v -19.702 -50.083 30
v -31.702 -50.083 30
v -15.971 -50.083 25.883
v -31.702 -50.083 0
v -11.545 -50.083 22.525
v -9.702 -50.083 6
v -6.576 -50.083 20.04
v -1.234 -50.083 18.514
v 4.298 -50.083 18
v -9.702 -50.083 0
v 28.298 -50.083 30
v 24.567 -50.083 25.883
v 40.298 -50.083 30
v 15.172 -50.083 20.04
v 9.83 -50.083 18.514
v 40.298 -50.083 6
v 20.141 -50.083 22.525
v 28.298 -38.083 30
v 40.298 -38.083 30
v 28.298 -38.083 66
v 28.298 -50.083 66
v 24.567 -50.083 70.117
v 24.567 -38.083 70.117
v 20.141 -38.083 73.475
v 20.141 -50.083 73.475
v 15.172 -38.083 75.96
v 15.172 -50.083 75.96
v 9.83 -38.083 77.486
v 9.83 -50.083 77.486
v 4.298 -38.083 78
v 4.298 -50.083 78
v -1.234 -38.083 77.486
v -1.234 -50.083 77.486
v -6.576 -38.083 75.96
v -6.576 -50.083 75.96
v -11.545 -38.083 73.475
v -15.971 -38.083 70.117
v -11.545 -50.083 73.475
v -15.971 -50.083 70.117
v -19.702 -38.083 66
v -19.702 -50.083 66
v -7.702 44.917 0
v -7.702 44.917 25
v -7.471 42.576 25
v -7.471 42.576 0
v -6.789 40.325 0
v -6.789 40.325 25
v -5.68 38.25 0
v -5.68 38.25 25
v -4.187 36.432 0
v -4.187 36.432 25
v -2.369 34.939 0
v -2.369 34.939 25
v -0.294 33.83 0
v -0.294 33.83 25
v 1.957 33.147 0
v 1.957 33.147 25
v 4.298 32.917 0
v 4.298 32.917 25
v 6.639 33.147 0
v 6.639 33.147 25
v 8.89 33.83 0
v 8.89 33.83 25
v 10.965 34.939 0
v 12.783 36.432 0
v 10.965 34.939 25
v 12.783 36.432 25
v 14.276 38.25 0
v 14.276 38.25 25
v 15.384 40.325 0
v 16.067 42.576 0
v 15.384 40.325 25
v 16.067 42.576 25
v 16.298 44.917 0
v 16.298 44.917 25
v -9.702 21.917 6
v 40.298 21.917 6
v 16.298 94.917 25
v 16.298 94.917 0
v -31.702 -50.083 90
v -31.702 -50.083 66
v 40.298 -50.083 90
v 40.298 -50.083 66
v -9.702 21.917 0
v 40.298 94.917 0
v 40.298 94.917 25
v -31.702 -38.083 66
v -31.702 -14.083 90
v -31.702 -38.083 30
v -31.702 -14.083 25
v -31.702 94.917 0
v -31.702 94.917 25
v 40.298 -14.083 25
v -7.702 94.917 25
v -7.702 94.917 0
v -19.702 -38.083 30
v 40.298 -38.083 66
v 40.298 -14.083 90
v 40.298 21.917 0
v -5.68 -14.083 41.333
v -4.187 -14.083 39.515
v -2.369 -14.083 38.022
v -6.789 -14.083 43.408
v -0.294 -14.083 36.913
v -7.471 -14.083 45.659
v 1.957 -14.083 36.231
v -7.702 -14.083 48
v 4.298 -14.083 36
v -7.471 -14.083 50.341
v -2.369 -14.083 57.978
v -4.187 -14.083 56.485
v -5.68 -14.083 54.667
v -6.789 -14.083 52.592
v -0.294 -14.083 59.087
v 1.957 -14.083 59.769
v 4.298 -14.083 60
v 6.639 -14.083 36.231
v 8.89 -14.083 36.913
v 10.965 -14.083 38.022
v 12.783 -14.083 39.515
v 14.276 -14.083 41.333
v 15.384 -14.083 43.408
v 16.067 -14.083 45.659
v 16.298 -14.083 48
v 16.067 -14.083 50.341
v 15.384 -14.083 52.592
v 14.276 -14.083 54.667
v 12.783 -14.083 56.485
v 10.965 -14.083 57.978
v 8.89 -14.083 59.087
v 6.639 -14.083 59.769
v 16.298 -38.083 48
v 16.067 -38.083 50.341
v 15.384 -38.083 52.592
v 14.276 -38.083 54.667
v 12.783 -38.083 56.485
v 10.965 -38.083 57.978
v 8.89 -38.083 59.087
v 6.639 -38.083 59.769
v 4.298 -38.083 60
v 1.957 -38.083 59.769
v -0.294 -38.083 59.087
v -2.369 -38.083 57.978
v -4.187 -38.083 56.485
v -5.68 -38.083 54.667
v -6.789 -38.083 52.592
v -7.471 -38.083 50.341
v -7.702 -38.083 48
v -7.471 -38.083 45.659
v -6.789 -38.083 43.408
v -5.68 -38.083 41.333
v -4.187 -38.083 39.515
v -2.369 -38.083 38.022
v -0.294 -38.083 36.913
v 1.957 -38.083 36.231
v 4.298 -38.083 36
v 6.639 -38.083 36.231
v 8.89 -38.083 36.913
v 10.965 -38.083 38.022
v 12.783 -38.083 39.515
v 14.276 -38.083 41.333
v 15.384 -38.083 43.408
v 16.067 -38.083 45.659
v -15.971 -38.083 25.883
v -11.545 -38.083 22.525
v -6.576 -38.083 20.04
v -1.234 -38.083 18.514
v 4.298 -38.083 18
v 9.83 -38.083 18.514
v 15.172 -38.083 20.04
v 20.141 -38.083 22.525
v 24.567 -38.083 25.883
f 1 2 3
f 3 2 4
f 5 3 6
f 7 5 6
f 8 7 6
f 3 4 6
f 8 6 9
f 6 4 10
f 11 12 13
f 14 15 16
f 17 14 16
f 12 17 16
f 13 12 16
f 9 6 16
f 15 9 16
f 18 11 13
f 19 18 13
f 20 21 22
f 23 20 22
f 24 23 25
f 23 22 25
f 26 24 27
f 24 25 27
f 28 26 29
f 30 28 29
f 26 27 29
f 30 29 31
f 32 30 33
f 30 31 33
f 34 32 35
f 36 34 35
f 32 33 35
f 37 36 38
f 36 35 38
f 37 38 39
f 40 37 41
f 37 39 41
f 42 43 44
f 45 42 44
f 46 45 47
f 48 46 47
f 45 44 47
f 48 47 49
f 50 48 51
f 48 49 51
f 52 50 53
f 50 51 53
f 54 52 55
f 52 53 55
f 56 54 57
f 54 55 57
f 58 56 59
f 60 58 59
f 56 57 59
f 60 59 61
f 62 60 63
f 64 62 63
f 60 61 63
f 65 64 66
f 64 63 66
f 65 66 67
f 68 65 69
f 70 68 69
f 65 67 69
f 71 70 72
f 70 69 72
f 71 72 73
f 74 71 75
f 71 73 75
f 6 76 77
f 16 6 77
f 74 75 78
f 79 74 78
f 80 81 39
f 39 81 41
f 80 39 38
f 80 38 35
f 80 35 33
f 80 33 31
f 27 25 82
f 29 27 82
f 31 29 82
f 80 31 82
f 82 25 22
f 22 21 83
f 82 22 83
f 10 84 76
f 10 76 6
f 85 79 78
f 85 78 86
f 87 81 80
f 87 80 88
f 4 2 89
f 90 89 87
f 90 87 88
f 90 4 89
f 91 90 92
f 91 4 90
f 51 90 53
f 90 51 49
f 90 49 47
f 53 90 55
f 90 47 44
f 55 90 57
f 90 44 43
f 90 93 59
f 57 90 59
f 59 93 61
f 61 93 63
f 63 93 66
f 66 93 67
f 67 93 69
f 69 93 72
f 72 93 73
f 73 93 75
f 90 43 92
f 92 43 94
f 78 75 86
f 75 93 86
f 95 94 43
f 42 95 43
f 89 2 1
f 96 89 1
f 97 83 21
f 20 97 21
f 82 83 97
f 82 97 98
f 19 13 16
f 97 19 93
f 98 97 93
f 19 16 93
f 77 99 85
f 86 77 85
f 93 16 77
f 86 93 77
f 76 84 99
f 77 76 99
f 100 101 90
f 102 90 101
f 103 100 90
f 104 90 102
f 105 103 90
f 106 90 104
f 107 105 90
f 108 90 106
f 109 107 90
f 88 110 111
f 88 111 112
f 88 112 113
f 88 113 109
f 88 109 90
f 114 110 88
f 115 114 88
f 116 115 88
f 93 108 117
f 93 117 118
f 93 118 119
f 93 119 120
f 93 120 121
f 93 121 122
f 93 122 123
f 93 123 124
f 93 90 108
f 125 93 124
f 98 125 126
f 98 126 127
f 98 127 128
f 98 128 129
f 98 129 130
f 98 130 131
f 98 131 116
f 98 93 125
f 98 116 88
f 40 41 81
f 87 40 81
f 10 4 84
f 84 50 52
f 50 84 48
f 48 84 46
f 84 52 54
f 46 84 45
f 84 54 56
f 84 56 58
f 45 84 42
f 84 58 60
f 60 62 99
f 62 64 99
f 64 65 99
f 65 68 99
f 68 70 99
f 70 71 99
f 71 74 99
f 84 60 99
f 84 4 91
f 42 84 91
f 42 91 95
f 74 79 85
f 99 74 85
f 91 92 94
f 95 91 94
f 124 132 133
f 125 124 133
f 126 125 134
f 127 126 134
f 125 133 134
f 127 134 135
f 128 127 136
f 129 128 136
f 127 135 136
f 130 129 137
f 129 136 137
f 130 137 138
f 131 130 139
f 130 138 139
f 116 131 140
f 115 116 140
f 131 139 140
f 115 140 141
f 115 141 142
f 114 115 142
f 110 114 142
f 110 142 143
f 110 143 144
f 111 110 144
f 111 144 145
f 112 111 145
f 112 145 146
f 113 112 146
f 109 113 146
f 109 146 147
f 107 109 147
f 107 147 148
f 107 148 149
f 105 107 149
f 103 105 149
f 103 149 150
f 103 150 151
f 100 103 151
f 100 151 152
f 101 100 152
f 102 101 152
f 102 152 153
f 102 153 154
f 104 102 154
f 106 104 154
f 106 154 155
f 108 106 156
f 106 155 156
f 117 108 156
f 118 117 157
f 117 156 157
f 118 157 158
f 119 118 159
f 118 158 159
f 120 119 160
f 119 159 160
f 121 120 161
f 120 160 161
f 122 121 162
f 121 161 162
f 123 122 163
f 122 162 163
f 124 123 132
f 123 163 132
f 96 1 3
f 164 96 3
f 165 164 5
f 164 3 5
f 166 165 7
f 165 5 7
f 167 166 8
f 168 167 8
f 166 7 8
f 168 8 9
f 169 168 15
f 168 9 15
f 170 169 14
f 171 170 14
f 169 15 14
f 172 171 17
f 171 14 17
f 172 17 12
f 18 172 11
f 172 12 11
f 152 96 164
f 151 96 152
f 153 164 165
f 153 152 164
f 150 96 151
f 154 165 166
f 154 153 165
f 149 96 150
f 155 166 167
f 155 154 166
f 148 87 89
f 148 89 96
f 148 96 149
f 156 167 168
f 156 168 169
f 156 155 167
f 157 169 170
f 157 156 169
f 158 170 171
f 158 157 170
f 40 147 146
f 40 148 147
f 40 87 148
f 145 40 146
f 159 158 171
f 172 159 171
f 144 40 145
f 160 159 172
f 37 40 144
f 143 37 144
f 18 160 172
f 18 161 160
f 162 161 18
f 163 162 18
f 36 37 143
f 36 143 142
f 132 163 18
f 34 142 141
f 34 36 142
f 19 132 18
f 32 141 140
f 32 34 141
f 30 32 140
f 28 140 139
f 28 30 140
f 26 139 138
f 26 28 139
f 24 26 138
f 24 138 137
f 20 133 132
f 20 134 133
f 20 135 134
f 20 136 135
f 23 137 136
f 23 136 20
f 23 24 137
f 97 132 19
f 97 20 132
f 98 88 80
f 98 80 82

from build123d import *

# Parameters (mm, degrees)
F0_W      = 72
F0_H      = 145
F1_DEPTH  = 90
F2_W      = 109
F2_H      = 65
F3_DEPTH  = 72
F4_W      = 50
F4_H      = 72
F5_DEPTH  = 6
F7_DEPTH  = 25
F8_R      = 12
F9_DEPTH  = 12
F10_DEPTH = 36


with BuildPart() as f1:
    # F0 (on Top) → F1 (new body)
    with BuildSketch(Plane.XY):
        with Locations((4.297932, 22.416884)):
            Rectangle(F0_W, F0_H)
    extrude(amount=F1_DEPTH)

    # F2 (on face) → F3 (cut)
    with BuildSketch(Plane.YZ.offset(40.297932)):
        with Locations((40.416884, 57.5)):
            Rectangle(F2_W, F2_H)
    extrude(amount=-F3_DEPTH, mode=Mode.SUBTRACT)

    # F4 (on face) → F5 (cut)
    with BuildSketch(Plane(origin=(0, 0, 0), x_dir=(1, 0, 0), z_dir=(0, 0, -1))):
        with Locations((15.297932, 14.083116)):
            Rectangle(F4_W, F4_H)
    extrude(amount=-F5_DEPTH, mode=Mode.SUBTRACT)

    # F6 (on face) → F7 (cut)
    with BuildSketch(Plane.XY.offset(25)):
        with BuildLine():
            Line((16.297932, 94.916884), (-7.702068, 94.916884))
            Line((-7.702068, 94.916884), (-7.702068, 44.916884))
            ThreePointArc((-7.702068, 44.916884), (4.297932, 32.916884), (16.297932, 44.916884))
            Line((16.297932, 44.916884), (16.297932, 94.916884))
        make_face()
    extrude(amount=-F7_DEPTH, mode=Mode.SUBTRACT)

    # F8 (on face) → F9 (cut)
    with BuildSketch(Plane.XZ.offset(50.083116)):
        with BuildLine():
            Line((-19.702068, 66), (-31.702068, 66))
            Line((-31.702068, 66), (-31.702068, 30))
            Line((-31.702068, 30), (-19.702068, 30))
            ThreePointArc((-19.702068, 30), (4.297932, 18), (28.297932, 30))
            Line((28.297932, 30), (40.297932, 30))
            Line((40.297932, 30), (40.297932, 66))
            Line((40.297932, 66), (28.297932, 66))
            ThreePointArc((28.297932, 66), (4.297932, 78), (-19.702068, 66))
        make_face()
        with Locations((4.297932, 48)):
            Circle(F8_R, mode=Mode.SUBTRACT)
    extrude(amount=-F9_DEPTH, mode=Mode.SUBTRACT)

    # F8 (on face) → F10 (cut)
    with BuildSketch(Plane.XZ.offset(50.083116)):
        with Locations((4.297932, 48)):
            Circle(F8_R)
    extrude(amount=-F10_DEPTH, mode=Mode.SUBTRACT)


solid = f1.part
